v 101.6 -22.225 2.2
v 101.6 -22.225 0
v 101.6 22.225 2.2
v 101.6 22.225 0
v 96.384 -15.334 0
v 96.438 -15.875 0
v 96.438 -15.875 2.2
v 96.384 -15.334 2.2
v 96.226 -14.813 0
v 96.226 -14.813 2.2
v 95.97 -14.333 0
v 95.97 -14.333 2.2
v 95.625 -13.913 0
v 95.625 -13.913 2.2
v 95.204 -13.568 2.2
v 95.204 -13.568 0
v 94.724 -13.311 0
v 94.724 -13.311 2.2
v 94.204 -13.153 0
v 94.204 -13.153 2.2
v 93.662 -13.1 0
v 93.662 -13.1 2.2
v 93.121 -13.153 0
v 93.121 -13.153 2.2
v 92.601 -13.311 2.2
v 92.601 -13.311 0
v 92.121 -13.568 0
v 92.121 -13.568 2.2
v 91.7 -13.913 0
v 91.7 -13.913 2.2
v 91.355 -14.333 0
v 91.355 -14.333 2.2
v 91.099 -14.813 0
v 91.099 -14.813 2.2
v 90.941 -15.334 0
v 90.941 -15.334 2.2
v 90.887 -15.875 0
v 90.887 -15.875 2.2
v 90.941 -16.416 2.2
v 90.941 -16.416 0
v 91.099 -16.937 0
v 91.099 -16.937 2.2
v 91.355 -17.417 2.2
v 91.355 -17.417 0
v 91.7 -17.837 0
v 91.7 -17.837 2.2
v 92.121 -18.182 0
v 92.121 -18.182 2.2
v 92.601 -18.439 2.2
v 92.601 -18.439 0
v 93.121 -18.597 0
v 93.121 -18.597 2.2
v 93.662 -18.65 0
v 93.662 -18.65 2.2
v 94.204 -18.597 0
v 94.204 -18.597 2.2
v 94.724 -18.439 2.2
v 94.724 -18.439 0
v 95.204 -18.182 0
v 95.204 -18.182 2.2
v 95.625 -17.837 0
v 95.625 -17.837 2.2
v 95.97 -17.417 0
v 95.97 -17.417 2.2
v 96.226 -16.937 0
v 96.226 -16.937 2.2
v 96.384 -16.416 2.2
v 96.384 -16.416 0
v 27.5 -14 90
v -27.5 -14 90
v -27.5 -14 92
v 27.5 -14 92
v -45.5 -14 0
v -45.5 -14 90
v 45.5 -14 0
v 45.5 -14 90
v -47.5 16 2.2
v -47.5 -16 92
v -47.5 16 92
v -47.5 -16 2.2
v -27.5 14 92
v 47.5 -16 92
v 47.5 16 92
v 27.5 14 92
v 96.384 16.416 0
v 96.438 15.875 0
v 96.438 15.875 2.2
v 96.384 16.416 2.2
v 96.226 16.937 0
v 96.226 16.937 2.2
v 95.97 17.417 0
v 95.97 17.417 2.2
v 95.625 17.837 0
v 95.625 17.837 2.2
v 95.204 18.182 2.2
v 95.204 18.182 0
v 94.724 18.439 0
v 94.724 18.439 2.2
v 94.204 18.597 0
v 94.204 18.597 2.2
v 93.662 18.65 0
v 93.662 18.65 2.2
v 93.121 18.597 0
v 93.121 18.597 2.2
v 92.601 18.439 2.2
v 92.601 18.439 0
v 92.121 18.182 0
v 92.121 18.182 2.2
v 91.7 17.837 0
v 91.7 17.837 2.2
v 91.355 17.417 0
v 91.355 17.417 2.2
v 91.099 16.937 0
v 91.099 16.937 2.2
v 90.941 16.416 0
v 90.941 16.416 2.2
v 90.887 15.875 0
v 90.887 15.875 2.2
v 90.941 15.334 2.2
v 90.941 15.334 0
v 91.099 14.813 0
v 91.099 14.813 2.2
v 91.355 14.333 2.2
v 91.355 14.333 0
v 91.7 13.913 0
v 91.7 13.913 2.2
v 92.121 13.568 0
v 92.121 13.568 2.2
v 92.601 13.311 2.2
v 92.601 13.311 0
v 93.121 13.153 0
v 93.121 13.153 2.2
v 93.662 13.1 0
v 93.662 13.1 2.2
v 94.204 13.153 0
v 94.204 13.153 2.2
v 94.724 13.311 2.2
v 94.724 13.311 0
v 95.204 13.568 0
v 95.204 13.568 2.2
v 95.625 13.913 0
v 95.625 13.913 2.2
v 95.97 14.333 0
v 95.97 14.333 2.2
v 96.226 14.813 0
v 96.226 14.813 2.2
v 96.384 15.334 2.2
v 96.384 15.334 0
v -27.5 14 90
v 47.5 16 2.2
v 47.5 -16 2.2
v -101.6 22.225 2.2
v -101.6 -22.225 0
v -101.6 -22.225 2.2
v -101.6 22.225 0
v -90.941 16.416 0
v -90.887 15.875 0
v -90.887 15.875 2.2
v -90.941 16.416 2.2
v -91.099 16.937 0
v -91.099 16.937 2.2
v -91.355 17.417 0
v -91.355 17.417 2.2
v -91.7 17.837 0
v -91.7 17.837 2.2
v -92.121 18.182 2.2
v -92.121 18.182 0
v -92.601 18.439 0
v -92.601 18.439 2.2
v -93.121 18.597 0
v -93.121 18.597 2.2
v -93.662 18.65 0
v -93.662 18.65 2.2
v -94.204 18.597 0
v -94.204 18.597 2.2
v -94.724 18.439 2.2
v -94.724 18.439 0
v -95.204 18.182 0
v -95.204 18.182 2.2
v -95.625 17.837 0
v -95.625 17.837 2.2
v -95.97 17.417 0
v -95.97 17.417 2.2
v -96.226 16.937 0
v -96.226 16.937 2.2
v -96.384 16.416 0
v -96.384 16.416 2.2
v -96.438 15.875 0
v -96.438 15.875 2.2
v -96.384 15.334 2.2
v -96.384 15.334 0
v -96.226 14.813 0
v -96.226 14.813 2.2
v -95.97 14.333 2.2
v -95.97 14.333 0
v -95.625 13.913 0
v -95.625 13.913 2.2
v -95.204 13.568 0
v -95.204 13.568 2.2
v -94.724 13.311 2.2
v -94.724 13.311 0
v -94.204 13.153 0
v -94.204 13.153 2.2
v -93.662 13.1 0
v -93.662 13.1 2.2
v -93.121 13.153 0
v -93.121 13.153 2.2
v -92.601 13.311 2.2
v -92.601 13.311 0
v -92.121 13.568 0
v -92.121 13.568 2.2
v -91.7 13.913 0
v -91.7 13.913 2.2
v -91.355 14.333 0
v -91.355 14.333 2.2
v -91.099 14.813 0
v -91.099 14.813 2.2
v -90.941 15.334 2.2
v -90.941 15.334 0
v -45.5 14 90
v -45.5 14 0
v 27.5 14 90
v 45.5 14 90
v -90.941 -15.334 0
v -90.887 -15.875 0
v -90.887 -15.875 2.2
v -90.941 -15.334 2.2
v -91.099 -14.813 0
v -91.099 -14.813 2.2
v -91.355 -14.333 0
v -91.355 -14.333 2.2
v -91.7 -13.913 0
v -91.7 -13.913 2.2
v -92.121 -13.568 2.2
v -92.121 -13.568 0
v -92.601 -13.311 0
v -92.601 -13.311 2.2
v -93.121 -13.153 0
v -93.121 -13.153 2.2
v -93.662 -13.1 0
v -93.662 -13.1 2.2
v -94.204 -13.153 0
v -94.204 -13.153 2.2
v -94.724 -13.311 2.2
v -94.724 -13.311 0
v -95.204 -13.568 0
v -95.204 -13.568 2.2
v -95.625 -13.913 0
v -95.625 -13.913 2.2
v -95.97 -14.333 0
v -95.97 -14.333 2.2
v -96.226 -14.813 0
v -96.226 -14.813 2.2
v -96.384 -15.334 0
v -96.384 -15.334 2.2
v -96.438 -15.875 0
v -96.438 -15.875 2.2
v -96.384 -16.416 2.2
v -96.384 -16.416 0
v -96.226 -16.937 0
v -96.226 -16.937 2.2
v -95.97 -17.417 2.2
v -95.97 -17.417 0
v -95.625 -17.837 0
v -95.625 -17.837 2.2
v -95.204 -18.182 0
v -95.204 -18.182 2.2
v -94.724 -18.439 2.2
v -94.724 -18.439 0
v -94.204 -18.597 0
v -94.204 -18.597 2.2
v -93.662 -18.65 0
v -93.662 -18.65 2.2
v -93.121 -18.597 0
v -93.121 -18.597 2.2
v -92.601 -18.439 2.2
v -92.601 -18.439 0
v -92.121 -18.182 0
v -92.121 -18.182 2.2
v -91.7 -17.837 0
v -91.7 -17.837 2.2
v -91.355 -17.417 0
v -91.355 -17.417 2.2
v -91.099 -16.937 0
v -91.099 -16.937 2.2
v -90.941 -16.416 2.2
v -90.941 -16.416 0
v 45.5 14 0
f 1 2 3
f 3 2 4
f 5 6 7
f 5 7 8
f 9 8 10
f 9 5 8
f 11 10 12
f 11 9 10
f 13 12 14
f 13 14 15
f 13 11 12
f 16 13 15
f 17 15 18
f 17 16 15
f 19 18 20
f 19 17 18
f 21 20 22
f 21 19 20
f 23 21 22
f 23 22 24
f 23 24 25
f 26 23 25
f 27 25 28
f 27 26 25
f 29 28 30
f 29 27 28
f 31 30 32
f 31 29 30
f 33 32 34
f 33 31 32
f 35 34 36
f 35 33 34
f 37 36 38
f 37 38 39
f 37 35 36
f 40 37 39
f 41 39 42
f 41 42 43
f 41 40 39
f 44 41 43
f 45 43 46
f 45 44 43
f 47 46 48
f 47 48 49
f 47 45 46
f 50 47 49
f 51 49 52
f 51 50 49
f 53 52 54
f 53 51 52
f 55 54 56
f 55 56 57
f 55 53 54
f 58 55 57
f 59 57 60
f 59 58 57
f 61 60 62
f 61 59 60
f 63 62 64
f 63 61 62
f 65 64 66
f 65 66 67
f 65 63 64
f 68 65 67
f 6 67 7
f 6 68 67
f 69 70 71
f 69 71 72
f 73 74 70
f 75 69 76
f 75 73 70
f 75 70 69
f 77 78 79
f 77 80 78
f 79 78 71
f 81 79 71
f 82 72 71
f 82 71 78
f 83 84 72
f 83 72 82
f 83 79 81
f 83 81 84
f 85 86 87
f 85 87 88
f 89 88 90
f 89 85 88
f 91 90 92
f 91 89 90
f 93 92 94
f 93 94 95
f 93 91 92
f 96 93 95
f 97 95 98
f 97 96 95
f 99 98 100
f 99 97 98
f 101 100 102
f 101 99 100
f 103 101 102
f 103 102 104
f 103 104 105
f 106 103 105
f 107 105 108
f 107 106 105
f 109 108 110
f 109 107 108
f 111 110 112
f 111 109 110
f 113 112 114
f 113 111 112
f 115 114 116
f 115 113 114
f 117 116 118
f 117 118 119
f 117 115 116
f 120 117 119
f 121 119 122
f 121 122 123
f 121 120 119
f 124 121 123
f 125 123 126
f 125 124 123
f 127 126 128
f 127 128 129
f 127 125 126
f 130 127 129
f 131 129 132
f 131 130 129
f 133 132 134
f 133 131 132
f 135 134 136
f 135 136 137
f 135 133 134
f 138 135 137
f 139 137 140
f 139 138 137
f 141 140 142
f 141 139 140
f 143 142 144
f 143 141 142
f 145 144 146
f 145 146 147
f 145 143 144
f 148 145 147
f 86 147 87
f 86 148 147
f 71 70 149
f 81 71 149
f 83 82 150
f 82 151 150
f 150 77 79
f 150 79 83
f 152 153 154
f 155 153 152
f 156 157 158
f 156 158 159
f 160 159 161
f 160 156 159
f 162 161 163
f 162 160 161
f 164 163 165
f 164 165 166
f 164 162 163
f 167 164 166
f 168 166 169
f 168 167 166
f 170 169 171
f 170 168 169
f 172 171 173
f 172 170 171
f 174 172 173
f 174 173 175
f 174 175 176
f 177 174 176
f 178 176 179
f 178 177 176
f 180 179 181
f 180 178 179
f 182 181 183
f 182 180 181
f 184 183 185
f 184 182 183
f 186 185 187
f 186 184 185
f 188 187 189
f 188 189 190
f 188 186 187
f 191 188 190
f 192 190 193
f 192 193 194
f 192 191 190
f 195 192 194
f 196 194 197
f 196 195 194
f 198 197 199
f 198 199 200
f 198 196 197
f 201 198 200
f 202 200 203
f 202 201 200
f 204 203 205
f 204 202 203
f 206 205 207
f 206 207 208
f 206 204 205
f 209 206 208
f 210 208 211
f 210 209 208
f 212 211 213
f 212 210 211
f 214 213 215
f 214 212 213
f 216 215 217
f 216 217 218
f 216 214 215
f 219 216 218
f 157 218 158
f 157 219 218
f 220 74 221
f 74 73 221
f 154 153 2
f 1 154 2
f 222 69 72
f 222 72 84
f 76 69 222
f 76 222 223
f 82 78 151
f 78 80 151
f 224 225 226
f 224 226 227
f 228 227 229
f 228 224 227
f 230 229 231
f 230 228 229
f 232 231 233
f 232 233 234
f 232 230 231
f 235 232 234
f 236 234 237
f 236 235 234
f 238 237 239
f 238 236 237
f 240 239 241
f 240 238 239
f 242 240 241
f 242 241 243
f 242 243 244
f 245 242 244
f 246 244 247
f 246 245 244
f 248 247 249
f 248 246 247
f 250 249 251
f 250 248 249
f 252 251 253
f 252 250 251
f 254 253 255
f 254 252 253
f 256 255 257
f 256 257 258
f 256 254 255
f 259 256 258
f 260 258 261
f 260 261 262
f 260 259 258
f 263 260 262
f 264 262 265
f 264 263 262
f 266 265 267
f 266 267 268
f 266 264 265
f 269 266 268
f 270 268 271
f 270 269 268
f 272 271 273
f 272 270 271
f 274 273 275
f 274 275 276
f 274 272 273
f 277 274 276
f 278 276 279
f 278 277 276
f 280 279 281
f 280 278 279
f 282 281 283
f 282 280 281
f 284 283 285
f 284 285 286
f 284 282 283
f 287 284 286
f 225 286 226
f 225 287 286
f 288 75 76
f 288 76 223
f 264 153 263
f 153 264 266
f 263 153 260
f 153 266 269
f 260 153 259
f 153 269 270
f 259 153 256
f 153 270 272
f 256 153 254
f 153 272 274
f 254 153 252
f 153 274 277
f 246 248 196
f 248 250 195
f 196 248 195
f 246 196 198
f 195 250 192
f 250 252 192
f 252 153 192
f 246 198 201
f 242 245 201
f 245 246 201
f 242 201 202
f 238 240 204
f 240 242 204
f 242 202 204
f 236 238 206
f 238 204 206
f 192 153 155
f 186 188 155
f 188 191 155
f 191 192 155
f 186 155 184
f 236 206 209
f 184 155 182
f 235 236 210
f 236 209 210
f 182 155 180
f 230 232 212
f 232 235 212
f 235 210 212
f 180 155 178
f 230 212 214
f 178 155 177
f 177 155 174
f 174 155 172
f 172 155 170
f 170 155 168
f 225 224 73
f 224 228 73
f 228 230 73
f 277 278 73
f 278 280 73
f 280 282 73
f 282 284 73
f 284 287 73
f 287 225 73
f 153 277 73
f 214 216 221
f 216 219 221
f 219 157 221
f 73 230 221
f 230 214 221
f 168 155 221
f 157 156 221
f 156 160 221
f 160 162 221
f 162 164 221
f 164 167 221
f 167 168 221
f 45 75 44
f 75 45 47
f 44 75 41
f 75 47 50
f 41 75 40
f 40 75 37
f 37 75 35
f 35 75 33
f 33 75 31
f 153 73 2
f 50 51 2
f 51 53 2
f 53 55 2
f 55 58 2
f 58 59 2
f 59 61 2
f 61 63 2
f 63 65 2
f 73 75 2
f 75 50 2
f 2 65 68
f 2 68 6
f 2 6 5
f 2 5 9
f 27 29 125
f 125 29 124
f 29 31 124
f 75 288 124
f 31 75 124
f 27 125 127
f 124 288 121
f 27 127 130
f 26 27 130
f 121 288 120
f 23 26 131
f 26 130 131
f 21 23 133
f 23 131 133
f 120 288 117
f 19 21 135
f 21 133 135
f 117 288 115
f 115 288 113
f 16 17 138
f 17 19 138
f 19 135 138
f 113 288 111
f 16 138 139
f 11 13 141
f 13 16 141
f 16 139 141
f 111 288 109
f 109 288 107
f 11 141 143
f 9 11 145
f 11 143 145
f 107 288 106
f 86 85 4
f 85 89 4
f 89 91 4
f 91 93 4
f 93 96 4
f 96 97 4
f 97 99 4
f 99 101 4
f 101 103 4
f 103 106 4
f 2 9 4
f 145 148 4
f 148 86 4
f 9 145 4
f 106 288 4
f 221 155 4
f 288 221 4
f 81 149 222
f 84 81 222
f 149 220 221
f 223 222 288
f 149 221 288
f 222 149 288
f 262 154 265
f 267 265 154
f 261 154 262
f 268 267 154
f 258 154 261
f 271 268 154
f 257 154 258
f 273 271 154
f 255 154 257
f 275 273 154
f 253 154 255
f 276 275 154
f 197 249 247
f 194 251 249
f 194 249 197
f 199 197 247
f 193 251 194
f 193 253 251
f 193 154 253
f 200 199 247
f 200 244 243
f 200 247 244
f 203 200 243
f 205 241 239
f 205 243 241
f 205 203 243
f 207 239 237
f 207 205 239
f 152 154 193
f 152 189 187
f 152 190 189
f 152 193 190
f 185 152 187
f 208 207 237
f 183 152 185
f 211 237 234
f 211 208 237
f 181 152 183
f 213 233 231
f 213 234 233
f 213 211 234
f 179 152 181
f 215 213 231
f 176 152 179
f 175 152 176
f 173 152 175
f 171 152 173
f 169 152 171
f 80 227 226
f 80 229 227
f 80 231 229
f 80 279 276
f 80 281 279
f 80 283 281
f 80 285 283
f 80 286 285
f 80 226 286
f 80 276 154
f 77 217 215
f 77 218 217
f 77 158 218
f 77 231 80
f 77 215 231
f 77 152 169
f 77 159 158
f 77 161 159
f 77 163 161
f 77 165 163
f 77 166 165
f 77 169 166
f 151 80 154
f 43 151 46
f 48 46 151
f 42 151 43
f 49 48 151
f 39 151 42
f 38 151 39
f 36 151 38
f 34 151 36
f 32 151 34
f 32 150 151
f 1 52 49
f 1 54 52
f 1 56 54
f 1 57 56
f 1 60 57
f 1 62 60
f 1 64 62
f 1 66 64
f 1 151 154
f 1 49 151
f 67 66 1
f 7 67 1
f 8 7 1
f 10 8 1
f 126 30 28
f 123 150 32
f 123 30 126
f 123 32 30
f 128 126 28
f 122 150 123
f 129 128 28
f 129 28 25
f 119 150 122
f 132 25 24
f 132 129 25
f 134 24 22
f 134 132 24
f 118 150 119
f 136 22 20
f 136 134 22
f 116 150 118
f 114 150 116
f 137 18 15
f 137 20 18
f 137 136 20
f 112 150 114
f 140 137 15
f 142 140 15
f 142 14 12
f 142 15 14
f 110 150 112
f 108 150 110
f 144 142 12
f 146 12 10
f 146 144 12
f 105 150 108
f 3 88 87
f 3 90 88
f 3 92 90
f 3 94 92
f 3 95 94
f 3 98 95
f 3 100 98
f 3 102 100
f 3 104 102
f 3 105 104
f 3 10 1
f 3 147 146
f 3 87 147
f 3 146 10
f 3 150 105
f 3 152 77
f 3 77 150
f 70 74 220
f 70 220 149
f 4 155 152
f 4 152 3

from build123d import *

# Parameters (mm, degrees)
SKETCH_W      = 203.2
SKETCH_H      = 44.45
SKETCH_R      = 2.775
SKETCH_W_2    = 91
SKETCH_H_2    = 28
PAD_DEPTH     = 2.2
SKETCH001_W   = 95
SKETCH001_H   = 32
SKETCH001_W_2 = 91
SKETCH001_H_2 = 28
PAD001_DEPTH  = 87.8
SKETCH002_W   = 95
SKETCH002_H   = 32
SKETCH002_W_2 = 55
SKETCH002_H_2 = 28
PAD002_DEPTH  = 2


with BuildPart() as part:
    # Sketch → Pad (new body)
    with BuildSketch(Plane.XY):
        Rectangle(SKETCH_W, SKETCH_H)
        with Locations((-93.6625, 15.875)):
            Circle(SKETCH_R, mode=Mode.SUBTRACT)
        with Locations((-93.6625, -15.875)):
            Circle(SKETCH_R, mode=Mode.SUBTRACT)
        with Locations((93.6625, 15.875)):
            Circle(SKETCH_R, mode=Mode.SUBTRACT)
        with Locations((93.6625, -15.875)):
            Circle(SKETCH_R, mode=Mode.SUBTRACT)
        Rectangle(SKETCH_W_2, SKETCH_H_2, mode=Mode.SUBTRACT)
    extrude(amount=PAD_DEPTH)

    # Sketch001 (on Face14 of Pad) → Pad001 (join)
    with BuildSketch(Plane.XY.offset(2.2)):
        Rectangle(SKETCH001_W, SKETCH001_H)
        Rectangle(SKETCH001_W_2, SKETCH001_H_2, mode=Mode.SUBTRACT)
    extrude(amount=PAD001_DEPTH)

    # Sketch002 (on Face23 of Pad001) → Pad002 (join)
    with BuildSketch(Plane.XY.offset(90)):
        Rectangle(SKETCH002_W, SKETCH002_H)
        Rectangle(SKETCH002_W_2, SKETCH002_H_2, mode=Mode.SUBTRACT)
    extrude(amount=PAD002_DEPTH)


solid = part.part
